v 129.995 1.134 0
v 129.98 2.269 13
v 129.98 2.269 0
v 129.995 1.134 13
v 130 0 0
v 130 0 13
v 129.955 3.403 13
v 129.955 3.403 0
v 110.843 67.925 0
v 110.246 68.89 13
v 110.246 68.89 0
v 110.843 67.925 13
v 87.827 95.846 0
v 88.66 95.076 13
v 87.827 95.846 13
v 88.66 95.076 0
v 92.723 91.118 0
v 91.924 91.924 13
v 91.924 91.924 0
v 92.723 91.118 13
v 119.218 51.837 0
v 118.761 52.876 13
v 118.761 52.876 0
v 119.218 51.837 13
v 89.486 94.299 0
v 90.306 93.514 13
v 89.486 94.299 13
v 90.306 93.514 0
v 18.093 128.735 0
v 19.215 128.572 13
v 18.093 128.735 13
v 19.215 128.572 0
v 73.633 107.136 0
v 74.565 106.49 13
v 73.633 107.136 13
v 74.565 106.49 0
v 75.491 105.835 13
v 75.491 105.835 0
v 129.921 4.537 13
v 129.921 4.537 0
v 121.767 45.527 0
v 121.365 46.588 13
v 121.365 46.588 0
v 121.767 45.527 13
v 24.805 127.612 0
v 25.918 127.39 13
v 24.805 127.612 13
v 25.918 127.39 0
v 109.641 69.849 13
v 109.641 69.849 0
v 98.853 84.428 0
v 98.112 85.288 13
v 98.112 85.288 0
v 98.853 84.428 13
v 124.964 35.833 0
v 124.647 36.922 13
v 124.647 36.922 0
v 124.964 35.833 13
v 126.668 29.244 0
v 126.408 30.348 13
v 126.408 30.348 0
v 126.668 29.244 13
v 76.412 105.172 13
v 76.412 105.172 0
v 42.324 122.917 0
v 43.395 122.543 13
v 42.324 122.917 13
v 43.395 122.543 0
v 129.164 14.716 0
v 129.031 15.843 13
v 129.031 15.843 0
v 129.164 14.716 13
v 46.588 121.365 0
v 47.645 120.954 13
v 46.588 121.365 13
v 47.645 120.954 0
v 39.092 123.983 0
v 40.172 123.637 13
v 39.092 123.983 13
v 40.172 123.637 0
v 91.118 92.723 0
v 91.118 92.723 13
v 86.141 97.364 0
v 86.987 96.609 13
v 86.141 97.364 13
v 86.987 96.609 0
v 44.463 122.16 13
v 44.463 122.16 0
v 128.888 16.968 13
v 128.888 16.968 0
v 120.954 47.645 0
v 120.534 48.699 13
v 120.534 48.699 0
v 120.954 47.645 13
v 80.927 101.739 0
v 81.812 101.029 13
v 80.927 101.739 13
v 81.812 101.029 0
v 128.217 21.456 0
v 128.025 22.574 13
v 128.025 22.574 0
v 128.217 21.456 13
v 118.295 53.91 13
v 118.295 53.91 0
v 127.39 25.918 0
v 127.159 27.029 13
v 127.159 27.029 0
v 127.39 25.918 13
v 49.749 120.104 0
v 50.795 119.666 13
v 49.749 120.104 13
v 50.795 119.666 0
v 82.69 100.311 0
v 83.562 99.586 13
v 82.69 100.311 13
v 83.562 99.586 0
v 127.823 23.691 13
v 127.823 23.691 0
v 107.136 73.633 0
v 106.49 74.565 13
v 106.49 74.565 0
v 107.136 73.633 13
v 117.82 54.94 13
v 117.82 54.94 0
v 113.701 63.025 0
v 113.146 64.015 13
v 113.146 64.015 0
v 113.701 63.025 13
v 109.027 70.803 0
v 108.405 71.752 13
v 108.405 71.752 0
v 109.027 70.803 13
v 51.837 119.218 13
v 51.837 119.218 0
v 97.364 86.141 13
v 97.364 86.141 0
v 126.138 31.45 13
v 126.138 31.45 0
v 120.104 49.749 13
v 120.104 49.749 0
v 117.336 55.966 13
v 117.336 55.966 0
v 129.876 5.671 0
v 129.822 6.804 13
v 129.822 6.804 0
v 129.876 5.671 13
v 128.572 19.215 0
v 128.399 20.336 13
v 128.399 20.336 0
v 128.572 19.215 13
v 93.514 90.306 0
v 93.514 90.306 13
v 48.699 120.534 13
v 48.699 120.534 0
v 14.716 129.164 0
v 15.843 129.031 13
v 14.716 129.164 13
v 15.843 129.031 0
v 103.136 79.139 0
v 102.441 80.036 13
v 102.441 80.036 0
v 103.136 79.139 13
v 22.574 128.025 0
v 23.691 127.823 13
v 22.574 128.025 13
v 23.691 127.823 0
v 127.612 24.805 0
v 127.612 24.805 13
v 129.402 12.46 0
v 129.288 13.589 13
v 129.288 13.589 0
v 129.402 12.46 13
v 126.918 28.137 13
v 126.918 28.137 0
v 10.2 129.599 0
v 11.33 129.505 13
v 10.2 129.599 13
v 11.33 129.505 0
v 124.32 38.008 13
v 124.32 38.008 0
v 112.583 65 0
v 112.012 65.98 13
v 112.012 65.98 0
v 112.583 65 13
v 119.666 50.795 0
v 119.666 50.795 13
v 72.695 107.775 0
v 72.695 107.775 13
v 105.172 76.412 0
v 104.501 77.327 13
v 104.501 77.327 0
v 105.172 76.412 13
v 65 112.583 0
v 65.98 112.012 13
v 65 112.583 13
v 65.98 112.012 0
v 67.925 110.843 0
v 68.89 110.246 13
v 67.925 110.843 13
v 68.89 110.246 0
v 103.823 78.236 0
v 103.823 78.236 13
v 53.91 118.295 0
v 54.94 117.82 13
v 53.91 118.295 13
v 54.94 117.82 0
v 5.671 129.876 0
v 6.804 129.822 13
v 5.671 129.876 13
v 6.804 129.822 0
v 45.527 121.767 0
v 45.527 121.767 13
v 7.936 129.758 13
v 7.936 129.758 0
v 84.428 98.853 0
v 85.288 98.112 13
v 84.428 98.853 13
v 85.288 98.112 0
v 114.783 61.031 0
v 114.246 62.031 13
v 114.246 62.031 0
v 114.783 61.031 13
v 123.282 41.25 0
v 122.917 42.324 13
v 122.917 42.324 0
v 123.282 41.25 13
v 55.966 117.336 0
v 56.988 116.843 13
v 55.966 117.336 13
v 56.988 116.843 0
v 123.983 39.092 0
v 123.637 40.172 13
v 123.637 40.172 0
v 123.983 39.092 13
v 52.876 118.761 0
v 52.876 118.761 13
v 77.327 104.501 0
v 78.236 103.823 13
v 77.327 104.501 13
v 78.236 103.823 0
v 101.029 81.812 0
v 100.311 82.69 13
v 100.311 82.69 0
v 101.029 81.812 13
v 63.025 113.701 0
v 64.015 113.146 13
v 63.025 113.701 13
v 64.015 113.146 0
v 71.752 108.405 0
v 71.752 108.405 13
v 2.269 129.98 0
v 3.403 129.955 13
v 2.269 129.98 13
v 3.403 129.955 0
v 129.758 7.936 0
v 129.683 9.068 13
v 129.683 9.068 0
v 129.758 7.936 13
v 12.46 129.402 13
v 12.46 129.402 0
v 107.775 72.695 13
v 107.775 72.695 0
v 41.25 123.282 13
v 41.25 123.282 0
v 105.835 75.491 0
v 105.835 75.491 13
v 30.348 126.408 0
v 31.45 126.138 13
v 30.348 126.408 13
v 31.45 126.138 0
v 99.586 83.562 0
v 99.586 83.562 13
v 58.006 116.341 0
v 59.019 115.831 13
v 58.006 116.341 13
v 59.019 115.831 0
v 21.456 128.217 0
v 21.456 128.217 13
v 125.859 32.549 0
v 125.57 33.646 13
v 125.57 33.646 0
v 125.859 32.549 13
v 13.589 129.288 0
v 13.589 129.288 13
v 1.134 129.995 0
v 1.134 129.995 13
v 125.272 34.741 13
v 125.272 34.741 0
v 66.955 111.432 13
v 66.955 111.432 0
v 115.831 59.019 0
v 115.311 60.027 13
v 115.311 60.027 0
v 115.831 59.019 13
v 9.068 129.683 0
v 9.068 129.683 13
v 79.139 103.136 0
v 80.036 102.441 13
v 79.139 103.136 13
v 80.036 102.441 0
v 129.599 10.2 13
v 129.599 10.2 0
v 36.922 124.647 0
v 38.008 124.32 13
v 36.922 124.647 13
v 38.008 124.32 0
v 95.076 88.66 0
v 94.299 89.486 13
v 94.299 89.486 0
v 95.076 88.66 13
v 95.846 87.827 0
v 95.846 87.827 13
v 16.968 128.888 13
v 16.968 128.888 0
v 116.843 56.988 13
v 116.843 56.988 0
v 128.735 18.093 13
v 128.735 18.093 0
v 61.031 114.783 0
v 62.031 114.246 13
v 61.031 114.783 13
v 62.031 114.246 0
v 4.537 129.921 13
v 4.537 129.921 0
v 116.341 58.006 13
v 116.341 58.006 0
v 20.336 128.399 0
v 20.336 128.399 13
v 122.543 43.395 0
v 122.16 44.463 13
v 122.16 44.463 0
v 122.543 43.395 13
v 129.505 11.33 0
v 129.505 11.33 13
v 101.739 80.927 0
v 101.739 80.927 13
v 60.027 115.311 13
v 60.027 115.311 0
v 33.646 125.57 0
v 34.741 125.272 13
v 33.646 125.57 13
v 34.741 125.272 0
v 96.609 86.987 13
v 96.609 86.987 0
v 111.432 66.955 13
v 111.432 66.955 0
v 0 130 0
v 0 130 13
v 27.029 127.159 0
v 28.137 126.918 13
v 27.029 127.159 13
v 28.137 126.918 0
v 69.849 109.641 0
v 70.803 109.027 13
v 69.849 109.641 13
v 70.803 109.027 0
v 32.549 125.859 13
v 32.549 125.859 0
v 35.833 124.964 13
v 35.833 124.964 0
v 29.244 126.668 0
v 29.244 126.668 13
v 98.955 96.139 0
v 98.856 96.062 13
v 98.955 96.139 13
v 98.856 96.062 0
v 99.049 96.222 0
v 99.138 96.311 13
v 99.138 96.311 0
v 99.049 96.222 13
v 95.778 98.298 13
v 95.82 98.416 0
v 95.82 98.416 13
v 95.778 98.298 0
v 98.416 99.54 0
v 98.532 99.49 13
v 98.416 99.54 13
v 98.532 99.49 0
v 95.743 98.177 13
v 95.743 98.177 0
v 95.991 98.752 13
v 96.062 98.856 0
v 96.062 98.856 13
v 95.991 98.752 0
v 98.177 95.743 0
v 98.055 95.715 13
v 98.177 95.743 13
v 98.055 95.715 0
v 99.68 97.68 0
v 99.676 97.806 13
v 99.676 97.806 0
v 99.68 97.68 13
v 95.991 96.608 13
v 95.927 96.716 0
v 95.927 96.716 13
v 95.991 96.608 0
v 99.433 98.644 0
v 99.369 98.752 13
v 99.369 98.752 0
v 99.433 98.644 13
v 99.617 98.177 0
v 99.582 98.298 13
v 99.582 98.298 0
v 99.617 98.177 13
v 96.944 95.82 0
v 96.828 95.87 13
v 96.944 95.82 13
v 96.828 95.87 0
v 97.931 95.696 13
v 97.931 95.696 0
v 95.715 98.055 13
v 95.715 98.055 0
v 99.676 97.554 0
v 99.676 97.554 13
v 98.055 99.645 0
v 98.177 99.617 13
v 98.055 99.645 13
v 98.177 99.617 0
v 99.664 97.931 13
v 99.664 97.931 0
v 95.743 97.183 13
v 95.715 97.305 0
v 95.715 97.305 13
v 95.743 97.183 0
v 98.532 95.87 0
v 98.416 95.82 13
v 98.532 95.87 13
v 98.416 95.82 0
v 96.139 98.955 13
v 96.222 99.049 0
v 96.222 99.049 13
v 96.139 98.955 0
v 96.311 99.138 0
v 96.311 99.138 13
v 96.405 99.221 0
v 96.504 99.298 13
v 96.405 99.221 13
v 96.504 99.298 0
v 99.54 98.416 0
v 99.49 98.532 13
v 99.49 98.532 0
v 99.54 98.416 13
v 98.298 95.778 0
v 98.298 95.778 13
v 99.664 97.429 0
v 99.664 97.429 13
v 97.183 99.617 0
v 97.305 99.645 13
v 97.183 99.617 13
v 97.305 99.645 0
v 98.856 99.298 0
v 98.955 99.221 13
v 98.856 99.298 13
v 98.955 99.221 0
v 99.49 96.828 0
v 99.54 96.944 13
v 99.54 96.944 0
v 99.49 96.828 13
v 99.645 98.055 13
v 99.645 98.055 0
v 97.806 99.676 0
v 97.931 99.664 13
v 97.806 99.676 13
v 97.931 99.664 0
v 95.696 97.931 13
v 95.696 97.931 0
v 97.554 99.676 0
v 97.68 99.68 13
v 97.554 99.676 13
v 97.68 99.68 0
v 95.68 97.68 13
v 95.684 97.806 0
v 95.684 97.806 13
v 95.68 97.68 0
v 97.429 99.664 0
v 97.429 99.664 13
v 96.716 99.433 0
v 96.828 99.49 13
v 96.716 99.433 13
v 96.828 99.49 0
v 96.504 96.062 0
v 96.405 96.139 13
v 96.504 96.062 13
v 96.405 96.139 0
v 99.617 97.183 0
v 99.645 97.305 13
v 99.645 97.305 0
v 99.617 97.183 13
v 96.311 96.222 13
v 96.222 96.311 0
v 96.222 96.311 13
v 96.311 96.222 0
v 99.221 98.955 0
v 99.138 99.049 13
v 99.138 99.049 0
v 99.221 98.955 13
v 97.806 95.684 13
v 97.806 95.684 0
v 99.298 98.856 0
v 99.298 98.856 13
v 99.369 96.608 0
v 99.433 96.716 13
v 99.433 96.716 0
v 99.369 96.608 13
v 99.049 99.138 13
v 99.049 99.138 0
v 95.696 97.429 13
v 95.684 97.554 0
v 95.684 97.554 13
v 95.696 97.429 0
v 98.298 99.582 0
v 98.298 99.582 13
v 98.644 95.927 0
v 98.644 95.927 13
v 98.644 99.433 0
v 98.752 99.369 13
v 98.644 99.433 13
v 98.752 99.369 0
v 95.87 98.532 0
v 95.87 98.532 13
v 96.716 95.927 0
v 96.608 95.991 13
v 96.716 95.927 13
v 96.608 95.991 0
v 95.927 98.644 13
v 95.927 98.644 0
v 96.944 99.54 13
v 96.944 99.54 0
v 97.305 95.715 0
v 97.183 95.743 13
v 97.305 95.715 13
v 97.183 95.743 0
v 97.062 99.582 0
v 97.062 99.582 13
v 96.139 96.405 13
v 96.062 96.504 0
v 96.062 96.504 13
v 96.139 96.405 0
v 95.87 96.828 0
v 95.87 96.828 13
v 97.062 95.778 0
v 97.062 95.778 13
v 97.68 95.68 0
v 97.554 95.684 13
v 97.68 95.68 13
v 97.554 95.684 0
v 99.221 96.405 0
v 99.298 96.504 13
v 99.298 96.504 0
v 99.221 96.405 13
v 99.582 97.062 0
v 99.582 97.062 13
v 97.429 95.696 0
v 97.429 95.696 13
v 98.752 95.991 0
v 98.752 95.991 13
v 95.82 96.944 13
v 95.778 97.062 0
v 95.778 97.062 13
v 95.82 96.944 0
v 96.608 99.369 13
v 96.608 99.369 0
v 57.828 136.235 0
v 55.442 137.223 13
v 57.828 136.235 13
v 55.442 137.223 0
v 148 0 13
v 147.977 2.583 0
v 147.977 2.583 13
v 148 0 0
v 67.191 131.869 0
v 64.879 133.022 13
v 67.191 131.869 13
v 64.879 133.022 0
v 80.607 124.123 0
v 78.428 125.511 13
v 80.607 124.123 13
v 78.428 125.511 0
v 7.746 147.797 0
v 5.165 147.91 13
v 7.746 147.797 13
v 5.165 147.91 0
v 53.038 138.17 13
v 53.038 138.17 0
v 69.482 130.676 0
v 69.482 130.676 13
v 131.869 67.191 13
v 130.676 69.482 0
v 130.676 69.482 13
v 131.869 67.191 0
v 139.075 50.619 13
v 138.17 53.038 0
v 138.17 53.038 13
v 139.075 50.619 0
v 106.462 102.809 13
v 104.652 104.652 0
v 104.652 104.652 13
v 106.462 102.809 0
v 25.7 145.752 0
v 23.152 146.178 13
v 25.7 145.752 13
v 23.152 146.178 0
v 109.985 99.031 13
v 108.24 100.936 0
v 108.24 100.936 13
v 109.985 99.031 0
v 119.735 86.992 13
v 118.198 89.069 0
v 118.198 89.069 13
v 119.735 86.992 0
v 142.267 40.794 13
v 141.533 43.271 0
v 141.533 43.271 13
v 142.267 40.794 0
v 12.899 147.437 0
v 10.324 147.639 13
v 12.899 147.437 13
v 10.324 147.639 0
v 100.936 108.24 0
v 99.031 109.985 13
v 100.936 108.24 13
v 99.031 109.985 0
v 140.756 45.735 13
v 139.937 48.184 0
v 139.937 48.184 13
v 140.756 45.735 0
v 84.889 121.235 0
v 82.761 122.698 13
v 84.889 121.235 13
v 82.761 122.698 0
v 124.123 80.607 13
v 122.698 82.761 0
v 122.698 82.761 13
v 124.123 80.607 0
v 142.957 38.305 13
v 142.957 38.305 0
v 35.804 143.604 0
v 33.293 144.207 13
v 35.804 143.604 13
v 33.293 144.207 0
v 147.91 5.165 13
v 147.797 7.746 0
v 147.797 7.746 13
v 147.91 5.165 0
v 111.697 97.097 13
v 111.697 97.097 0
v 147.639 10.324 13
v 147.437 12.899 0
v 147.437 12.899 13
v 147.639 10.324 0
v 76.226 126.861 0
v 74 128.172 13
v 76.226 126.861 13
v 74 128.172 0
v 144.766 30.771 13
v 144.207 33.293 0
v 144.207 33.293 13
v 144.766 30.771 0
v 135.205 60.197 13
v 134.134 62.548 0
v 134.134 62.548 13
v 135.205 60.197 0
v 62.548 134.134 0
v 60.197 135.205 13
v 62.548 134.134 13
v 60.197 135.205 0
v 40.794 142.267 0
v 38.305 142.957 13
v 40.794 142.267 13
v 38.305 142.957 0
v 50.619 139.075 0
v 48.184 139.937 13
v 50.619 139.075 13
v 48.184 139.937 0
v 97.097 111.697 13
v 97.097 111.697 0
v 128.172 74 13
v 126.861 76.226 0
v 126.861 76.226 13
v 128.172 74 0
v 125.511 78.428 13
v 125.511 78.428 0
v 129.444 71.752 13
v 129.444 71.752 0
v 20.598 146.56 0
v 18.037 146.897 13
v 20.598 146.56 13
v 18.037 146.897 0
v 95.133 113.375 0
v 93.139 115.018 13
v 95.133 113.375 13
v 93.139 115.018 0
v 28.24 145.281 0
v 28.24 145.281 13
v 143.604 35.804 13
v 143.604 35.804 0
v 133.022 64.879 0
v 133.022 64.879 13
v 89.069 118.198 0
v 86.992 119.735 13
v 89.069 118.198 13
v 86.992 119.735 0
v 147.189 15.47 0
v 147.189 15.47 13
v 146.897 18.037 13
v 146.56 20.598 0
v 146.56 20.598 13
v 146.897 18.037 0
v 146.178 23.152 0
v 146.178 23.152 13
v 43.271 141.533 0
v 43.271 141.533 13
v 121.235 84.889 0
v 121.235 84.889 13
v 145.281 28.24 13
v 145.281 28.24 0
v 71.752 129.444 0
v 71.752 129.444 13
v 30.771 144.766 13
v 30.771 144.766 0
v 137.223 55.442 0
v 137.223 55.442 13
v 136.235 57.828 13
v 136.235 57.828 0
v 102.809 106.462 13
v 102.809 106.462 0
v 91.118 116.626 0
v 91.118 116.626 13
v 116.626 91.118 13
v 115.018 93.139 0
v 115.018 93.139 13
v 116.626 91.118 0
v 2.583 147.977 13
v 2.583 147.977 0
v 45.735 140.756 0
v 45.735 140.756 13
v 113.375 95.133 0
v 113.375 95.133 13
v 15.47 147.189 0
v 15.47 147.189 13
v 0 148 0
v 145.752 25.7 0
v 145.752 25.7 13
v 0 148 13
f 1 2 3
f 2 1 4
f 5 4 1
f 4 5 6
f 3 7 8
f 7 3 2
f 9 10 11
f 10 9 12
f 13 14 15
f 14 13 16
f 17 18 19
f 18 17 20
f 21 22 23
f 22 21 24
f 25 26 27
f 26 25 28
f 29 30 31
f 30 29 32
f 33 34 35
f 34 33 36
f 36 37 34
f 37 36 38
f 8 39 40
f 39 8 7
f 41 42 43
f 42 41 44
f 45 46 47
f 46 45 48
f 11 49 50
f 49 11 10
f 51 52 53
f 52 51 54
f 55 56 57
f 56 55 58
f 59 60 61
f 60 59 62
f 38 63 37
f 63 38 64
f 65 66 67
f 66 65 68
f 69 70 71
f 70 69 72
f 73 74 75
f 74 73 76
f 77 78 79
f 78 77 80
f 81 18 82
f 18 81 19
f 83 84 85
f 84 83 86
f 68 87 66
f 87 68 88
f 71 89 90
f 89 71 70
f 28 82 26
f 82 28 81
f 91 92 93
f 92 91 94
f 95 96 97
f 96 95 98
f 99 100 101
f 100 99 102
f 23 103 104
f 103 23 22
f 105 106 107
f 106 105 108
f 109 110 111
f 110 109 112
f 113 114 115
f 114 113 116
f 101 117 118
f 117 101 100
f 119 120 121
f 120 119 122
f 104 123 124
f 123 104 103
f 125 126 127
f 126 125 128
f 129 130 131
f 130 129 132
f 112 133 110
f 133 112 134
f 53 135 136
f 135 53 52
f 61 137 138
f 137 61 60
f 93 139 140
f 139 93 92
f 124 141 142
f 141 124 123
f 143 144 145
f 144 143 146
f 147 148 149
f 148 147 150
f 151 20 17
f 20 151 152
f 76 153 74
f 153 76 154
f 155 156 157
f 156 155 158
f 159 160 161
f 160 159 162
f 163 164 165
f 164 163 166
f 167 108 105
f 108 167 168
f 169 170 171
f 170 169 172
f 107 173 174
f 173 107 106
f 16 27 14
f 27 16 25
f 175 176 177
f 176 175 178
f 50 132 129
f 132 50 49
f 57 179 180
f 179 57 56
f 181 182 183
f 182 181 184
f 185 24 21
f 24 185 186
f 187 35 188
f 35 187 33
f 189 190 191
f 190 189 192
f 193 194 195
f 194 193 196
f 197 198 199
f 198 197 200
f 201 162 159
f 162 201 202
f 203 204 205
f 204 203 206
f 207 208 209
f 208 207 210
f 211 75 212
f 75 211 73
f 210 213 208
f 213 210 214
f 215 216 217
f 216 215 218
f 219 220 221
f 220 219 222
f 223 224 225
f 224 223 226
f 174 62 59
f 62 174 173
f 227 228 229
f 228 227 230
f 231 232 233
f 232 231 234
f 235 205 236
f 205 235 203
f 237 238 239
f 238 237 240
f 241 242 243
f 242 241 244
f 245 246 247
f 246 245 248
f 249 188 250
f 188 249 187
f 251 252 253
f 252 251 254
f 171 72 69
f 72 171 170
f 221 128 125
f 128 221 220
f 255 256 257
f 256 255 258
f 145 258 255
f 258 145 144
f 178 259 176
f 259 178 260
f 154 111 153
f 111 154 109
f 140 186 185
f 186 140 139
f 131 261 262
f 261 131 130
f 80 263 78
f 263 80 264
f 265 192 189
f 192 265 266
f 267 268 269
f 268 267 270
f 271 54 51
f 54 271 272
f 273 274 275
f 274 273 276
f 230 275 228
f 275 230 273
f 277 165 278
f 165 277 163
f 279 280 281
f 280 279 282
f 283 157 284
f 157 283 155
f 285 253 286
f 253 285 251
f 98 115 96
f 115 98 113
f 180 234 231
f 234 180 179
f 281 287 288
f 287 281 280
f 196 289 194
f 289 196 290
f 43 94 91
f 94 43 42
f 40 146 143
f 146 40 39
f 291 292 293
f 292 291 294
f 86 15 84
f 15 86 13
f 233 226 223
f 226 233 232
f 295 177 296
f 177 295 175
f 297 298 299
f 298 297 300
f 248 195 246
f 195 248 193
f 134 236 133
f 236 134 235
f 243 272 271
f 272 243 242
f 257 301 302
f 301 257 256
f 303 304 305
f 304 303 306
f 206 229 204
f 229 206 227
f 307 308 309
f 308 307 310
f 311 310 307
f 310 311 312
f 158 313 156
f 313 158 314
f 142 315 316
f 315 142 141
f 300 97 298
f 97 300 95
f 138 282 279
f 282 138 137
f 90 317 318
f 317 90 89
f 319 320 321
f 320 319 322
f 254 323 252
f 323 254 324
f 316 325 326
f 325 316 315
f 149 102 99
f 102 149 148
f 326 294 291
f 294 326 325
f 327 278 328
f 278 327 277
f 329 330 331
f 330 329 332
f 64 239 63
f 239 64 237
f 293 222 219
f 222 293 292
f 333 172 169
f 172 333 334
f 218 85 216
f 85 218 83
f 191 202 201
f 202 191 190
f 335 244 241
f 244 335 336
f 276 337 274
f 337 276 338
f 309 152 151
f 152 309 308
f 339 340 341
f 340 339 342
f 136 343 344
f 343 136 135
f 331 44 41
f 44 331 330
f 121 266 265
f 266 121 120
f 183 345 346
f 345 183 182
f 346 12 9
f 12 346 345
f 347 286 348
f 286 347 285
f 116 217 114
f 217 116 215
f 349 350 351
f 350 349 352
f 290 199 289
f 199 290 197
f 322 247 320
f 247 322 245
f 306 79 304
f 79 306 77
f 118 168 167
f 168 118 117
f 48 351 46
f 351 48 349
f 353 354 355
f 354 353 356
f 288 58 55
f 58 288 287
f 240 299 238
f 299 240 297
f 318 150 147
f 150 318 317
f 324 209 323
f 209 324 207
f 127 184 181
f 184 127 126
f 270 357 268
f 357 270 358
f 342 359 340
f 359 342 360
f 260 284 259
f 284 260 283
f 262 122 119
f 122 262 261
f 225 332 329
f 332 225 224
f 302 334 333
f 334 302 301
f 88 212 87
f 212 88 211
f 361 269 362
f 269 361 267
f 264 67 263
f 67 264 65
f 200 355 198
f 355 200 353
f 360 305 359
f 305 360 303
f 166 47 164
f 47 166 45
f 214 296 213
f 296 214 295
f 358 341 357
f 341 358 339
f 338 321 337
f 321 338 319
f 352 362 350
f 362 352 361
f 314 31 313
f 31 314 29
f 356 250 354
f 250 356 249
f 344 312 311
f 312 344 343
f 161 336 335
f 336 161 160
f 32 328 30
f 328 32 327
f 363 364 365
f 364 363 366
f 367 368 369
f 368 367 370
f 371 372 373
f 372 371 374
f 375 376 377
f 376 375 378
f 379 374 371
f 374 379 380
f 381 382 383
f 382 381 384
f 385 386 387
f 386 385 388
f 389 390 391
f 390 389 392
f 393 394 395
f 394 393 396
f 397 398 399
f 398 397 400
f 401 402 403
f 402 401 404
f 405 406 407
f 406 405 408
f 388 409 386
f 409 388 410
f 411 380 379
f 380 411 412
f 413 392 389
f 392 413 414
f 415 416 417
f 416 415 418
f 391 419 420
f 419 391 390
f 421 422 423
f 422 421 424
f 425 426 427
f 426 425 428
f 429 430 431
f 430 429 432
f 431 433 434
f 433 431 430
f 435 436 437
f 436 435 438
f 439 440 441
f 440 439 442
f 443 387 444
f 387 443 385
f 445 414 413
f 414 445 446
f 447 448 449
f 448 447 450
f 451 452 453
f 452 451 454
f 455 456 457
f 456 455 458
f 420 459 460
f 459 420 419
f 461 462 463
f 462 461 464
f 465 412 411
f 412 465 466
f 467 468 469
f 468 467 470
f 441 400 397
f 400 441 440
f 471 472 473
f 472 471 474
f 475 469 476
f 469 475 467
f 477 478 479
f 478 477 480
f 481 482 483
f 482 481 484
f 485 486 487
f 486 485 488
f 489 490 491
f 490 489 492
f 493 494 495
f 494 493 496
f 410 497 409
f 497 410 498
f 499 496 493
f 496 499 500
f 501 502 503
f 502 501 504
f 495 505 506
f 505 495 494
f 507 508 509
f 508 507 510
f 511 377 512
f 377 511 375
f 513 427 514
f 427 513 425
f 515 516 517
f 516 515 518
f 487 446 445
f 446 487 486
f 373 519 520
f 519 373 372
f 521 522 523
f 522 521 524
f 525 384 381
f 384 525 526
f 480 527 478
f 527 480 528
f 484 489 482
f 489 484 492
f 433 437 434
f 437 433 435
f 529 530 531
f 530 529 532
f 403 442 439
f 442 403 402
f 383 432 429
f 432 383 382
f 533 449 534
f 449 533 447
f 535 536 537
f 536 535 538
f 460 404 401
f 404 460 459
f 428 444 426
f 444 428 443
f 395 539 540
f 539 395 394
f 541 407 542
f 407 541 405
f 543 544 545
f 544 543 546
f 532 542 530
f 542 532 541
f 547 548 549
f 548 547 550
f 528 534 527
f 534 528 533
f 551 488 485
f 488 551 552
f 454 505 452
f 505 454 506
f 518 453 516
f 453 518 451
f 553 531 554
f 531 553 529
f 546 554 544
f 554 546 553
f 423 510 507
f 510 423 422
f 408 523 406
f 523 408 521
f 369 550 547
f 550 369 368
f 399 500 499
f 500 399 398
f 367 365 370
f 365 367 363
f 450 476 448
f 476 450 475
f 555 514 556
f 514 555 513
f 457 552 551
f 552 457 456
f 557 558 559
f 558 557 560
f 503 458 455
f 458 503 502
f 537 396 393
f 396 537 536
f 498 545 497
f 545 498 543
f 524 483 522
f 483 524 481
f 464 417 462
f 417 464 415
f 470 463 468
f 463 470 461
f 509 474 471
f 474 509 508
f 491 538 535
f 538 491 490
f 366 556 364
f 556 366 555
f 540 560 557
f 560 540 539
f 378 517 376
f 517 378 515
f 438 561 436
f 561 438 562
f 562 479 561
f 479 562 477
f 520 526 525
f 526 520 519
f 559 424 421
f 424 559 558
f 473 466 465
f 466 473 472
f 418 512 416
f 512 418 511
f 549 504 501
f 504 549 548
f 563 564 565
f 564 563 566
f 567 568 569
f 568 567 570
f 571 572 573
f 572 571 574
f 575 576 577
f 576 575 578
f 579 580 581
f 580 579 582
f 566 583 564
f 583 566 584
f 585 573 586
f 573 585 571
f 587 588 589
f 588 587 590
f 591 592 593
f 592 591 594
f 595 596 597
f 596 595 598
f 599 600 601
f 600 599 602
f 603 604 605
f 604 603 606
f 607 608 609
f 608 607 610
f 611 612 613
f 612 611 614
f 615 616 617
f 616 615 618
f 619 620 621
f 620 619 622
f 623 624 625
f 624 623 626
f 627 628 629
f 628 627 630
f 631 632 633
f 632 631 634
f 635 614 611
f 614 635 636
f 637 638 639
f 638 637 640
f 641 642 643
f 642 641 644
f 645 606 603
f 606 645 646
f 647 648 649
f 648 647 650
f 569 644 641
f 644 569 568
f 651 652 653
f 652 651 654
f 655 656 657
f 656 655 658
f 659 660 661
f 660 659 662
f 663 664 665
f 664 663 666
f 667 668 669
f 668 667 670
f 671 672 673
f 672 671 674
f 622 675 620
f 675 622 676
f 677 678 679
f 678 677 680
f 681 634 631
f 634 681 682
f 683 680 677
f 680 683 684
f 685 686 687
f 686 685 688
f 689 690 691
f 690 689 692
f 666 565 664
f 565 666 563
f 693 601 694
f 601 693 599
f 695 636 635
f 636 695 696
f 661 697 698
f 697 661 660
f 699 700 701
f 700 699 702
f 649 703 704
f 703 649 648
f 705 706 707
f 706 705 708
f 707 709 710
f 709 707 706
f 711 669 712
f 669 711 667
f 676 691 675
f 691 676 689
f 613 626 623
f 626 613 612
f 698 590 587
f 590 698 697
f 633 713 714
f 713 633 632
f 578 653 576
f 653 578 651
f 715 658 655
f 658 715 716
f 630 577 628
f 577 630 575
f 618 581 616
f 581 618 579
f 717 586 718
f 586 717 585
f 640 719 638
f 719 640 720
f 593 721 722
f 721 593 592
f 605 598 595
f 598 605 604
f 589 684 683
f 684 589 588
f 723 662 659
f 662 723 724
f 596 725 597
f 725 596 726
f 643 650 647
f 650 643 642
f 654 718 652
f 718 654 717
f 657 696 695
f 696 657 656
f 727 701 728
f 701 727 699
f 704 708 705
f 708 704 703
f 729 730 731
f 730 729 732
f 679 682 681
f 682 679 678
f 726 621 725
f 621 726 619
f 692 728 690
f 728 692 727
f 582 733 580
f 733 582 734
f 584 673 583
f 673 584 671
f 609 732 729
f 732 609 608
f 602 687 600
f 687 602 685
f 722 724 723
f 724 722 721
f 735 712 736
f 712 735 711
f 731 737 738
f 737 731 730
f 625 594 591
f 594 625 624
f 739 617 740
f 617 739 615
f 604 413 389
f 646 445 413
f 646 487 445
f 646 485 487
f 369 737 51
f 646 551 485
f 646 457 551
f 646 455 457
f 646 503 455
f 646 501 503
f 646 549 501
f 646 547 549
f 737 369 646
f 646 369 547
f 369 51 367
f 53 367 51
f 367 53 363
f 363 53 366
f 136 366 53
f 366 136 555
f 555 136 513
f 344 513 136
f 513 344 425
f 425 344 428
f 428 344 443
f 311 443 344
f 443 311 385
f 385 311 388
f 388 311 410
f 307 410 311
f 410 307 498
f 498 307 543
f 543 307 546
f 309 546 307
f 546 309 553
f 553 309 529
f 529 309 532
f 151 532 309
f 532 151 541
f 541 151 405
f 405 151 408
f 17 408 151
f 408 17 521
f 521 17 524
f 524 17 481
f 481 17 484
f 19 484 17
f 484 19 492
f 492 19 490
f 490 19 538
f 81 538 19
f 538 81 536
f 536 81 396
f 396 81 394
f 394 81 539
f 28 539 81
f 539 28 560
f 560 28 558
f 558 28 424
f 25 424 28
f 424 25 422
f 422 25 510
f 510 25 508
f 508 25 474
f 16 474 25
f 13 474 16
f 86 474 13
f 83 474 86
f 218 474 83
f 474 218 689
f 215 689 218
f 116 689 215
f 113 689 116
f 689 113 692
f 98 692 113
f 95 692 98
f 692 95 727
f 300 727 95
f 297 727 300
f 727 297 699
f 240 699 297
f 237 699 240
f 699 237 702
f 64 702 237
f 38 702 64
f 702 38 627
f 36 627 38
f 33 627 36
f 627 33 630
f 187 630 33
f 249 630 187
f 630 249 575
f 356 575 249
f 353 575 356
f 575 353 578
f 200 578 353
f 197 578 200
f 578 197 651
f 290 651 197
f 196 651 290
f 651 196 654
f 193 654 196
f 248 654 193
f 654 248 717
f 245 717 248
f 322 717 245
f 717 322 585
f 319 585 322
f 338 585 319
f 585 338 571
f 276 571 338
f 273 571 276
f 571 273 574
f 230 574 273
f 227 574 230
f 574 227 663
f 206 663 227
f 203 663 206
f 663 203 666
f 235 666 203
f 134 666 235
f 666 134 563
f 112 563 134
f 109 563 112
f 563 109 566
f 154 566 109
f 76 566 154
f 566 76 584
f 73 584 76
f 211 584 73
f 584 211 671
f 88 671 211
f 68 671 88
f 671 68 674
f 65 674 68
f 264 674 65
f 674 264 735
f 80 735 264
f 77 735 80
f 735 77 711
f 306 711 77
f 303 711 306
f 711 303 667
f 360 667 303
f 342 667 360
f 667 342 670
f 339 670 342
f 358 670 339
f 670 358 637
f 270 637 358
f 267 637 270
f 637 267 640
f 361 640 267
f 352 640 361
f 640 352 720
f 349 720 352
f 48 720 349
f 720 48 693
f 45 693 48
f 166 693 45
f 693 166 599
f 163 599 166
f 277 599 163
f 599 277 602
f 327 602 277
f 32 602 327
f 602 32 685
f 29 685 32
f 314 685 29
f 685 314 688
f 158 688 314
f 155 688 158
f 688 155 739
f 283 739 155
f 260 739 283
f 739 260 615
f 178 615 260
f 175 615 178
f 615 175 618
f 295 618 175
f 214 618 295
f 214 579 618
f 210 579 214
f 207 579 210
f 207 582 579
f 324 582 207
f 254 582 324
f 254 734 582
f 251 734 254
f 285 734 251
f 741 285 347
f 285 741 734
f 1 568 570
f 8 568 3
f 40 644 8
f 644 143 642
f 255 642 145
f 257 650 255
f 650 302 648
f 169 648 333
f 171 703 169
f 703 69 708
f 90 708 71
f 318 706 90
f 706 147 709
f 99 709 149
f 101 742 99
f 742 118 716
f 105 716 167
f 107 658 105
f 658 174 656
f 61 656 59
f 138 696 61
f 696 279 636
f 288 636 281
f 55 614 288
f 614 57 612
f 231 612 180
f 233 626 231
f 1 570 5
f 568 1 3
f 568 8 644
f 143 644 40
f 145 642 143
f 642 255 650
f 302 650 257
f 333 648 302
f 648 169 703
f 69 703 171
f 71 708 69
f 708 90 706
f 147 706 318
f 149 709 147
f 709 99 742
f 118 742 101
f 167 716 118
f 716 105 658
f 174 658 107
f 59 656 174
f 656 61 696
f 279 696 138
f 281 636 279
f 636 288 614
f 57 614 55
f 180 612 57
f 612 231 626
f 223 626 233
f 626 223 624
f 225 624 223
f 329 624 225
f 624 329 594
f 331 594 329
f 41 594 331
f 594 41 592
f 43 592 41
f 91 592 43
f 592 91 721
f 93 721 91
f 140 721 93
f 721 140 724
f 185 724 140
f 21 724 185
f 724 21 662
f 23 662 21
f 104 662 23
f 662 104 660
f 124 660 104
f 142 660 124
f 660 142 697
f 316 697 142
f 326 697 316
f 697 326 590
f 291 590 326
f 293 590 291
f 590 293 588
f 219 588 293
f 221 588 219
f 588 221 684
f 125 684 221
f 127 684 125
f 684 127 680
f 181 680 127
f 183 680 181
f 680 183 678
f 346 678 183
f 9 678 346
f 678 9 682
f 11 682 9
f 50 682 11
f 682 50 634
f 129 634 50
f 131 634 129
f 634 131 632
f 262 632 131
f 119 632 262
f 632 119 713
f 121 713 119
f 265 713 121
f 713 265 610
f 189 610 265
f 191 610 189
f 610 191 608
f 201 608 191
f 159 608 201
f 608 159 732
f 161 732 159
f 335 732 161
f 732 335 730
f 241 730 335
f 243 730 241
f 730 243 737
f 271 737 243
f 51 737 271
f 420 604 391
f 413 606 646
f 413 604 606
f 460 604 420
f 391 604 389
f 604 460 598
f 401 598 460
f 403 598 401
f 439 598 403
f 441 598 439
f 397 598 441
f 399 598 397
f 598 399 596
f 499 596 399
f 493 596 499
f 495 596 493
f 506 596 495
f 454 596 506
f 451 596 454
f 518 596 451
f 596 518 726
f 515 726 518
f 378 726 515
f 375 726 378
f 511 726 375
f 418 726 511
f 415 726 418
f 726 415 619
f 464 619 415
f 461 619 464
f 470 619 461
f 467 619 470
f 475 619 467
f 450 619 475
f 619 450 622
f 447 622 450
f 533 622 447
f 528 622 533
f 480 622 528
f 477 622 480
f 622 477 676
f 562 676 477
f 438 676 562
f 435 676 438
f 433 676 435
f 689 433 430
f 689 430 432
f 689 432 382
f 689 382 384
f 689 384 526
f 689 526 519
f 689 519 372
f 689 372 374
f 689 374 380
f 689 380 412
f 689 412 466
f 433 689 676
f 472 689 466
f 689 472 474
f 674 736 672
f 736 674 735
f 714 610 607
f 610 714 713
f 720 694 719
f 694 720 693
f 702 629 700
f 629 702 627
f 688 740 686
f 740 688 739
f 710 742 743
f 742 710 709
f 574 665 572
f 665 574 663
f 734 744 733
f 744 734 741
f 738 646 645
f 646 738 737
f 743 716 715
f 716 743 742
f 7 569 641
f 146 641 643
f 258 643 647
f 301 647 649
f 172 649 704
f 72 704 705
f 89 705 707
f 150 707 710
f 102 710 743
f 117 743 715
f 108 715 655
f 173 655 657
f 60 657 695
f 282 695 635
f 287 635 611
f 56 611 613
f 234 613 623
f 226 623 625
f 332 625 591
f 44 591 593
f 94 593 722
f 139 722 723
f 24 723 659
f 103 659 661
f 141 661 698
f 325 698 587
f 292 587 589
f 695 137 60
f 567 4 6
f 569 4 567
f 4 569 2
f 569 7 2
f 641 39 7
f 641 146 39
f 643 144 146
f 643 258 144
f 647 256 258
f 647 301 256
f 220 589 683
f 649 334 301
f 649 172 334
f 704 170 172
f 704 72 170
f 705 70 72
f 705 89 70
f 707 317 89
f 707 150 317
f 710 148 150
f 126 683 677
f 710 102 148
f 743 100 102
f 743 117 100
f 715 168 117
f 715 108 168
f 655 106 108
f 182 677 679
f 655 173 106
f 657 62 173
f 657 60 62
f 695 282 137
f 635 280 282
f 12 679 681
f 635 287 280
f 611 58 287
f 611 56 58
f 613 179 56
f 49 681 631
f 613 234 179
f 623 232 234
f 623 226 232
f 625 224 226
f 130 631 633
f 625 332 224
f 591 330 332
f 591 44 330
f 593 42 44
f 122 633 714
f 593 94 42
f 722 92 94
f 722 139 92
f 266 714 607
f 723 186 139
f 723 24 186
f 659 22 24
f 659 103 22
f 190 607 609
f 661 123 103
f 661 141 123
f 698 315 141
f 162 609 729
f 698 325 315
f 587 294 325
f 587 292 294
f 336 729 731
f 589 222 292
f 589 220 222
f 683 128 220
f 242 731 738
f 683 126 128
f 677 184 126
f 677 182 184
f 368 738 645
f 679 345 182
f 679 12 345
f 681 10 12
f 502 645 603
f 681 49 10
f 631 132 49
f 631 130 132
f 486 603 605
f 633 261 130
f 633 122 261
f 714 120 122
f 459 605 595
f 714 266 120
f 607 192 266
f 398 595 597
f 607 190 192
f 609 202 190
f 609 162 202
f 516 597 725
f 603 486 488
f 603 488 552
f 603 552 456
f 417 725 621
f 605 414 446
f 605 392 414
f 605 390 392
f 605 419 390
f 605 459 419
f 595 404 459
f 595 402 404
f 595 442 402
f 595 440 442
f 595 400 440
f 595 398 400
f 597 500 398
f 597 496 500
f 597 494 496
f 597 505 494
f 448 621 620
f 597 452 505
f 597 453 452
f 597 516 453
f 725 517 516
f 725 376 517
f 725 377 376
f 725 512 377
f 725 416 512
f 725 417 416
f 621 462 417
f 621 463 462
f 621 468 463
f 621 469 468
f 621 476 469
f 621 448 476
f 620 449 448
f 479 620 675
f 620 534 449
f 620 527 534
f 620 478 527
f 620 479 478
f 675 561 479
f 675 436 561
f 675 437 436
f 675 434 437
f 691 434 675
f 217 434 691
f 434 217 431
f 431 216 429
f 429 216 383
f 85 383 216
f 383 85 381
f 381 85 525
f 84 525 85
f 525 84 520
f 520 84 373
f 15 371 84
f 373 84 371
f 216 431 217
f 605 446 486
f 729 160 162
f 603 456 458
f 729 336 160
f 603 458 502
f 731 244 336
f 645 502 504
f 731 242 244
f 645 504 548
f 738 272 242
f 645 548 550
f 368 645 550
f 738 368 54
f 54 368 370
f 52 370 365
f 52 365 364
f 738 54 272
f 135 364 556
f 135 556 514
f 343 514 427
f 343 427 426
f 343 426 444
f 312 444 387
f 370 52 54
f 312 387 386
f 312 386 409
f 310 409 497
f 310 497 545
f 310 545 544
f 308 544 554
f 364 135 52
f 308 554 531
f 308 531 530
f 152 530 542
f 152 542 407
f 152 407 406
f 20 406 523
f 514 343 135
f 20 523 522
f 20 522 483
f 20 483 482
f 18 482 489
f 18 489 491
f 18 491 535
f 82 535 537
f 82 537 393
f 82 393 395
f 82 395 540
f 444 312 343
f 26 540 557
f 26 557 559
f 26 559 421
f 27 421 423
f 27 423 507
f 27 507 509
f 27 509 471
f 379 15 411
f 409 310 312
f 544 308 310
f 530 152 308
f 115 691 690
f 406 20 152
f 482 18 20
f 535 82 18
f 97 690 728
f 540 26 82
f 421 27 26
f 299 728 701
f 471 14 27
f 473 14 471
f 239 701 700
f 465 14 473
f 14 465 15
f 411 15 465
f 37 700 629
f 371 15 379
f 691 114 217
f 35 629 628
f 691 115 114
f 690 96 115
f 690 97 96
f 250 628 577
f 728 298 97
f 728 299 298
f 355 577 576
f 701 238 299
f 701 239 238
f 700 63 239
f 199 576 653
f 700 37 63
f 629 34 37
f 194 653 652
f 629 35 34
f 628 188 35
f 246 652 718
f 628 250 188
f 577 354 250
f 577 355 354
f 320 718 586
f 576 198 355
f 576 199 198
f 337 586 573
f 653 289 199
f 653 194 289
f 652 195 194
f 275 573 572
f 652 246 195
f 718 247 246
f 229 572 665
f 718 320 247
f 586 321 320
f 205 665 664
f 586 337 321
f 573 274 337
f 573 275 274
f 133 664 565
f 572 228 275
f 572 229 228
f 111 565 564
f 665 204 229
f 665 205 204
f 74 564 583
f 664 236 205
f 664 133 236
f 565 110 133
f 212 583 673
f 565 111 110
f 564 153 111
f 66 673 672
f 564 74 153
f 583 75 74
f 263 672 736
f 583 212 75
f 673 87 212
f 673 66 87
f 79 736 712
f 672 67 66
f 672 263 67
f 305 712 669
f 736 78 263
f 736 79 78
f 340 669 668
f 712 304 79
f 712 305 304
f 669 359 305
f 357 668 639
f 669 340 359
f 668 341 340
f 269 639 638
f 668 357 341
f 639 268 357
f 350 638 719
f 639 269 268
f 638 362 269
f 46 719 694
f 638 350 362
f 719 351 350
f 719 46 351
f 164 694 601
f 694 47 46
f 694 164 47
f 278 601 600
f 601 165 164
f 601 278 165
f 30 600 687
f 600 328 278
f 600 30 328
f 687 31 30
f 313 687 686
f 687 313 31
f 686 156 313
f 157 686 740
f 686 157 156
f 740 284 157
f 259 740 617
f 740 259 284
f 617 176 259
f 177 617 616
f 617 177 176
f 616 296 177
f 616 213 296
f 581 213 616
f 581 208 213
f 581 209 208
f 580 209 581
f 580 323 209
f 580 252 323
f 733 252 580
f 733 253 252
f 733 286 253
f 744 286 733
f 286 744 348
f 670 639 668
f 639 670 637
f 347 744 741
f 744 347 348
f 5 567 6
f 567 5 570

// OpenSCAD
outer_dia = 296;

module glas_holder(){
    difference() {
        difference() {
            cylinder(17,r=outer_dia/2,$fn=360);
            translate([0,0,-1]){
                cylinder(19,r=280/2,$fn=720);
            }
        }
        union() {
            translate([-151,-151,-1]){
                cube([151,301,20]);
            }
            translate([-151,-151,-1]){
                cube([301,151,20]);
            }
        }
    }
}

module front_plate(){
    difference() {
        difference() {
            cylinder(1.5,r=outer_dia/2,$fn=360);
            translate([0,0,-1]){
                cylinder(19,r=8/2,$fn=720);
            }
        }
        union() {
            translate([-151,-151,-1]){
                cube([151,301,20]);
            }
            translate([-151,-151,-1]){
                cube([301,151,20]);
            }
        }
    }
}

module back_plate(){
    difference() {
        difference() {
            cylinder(1.5,r=outer_dia/2,$fn=360);
            translate([0,0,-1]){
                cylinder(19,r=160/2,$fn=720);
            }
        }
        union() {
            translate([-151,-151,-1]){
                cube([151,301,20]);
            }
            translate([-151,-151,-1]){
                cube([301,151,20]);
            }
        }
    }
}

module outer_ring(){
    difference() {
        difference() {
            cylinder(13,r=outer_dia/2,$fn=360);
            translate([0,0,-1]){
                cylinder(19,r=260/2,$fn=720);
                translate([(outer_dia/2)*0.66,(outer_dia/2)*0.66,0]) {
                    
                    cylinder(19,r=2,$fn=100);
                }
            }
            
        }
        
        union() {
            translate([-151,-151,-1]){
                cube([151,301,20]);
            }
            translate([-151,-151,-1]){
                cube([301,151,20]);
            }
        }
    }
}

//glas_holder();
//front_plate();
//back_plate();
outer_ring();
